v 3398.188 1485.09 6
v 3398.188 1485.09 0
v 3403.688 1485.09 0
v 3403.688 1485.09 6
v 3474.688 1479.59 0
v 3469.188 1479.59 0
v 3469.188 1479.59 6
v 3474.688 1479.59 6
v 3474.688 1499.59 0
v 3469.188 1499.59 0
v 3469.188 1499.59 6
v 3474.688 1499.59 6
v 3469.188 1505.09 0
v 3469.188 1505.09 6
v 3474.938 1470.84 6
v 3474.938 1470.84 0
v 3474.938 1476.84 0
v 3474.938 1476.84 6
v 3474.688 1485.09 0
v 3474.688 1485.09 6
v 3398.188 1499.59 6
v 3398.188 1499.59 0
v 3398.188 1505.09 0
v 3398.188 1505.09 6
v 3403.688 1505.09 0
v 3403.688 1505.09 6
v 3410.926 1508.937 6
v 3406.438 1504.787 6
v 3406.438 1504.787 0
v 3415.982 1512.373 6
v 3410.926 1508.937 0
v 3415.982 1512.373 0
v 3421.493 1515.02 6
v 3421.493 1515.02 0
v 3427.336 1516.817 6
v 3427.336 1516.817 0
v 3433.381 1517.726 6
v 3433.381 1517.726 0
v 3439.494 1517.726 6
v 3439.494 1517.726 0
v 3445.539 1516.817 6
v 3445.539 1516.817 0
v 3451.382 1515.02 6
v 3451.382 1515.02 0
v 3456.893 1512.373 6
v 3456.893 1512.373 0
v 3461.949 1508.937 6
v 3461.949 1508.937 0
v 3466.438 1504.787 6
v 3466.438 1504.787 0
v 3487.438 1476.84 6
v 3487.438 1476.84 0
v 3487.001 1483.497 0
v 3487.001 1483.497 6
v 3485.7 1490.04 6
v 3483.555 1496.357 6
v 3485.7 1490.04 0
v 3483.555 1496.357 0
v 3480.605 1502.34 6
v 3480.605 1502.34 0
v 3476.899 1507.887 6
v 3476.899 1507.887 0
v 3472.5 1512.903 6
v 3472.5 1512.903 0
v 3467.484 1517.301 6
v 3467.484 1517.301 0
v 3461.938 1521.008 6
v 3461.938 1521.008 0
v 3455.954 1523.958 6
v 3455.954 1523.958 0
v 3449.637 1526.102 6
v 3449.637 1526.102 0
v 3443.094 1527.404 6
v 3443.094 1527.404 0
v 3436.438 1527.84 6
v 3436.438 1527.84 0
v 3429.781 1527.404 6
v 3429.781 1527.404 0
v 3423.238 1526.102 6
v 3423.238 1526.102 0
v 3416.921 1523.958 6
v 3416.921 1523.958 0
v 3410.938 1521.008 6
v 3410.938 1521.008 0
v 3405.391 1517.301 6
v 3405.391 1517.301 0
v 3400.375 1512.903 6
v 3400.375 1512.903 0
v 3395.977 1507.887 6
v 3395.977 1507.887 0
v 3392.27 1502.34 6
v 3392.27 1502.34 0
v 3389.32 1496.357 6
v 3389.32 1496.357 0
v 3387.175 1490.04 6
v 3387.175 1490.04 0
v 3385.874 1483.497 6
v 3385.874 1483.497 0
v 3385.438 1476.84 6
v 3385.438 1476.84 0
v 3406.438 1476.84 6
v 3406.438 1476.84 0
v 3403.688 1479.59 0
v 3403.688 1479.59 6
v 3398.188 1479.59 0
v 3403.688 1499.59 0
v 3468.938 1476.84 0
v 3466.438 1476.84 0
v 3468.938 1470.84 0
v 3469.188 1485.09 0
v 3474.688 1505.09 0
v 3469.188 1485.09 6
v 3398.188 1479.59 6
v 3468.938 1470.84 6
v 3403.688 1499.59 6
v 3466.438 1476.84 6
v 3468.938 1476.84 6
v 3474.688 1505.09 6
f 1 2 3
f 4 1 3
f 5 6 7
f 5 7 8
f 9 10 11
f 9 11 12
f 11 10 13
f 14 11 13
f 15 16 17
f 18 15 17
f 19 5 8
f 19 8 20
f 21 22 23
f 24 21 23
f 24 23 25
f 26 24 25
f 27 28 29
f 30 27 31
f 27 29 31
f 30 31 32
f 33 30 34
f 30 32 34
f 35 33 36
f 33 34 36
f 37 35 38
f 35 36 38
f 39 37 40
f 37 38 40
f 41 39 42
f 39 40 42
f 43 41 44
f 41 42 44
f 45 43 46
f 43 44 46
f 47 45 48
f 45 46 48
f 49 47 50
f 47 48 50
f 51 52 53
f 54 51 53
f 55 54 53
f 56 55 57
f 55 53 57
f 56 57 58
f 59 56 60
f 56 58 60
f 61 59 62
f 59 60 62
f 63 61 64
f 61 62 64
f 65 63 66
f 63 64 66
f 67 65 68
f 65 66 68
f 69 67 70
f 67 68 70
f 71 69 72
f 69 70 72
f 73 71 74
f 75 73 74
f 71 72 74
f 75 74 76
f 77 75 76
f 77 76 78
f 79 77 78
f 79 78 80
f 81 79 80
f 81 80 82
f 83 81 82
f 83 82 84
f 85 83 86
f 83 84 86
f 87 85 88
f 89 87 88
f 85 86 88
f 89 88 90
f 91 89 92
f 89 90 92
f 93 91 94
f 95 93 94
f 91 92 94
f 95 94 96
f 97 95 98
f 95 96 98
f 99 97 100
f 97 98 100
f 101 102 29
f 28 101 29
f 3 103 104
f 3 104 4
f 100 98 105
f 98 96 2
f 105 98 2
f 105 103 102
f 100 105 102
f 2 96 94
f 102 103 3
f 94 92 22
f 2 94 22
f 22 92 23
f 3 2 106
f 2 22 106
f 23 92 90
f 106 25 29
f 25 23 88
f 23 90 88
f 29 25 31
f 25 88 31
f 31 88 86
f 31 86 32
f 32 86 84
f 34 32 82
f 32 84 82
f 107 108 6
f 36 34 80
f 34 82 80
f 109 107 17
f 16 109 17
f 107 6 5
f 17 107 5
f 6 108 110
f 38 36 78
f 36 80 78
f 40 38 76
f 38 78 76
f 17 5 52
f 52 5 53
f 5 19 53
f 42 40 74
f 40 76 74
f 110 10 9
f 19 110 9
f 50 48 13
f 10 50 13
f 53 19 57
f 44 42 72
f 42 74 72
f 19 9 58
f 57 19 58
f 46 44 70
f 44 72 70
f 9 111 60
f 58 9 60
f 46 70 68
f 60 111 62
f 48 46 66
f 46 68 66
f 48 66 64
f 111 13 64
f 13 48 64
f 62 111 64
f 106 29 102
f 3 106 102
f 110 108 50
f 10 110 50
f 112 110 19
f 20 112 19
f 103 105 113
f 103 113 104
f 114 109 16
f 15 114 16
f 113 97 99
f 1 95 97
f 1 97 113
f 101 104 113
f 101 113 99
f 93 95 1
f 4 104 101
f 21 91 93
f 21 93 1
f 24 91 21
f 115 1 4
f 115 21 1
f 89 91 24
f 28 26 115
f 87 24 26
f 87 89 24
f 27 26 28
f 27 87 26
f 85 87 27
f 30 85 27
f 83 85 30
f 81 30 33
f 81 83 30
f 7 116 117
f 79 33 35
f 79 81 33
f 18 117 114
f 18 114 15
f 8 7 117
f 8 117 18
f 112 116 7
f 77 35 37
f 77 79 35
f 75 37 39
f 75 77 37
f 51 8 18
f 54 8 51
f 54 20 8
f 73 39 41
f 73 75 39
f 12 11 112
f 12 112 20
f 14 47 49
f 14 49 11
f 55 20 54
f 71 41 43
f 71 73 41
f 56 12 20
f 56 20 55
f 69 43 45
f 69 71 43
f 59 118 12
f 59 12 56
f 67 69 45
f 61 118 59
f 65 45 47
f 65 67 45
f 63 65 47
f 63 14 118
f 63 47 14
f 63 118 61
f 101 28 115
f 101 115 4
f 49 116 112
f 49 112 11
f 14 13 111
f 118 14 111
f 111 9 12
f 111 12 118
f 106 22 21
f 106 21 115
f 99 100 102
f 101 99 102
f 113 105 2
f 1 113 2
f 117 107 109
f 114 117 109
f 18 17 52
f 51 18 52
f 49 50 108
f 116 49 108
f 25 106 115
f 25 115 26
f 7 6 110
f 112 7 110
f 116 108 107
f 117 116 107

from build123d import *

# Parameters (mm, degrees)
MODEL_W             = 5.5
MODEL_H             = 5.5
BOSS_EXTRUDE1_DEPTH = 6


with BuildPart() as part:
    # Model → Boss-Extrude1 (new body)
    with BuildSketch(Plane.XY):
        with BuildLine():
            Line((3385.437630562, 1476.840270732), (3395.437630562, 1476.840270732))
            Line((3395.437630562, 1476.840270732), (3406.437630562, 1476.840270732))
            Line((3406.437630562, 1476.840270732), (3406.437630562, 1504.786647956))
            ThreePointArc((3406.437630562, 1504.786647956), (3436.437630562, 1517.840270732), (3466.437630562, 1504.786647956))
            Line((3466.437630562, 1504.786647956), (3466.437630562, 1476.840270732))
            Line((3466.437630562, 1476.840270732), (3468.937630562, 1476.840270732))
            Line((3468.937630562, 1476.840270732), (3468.937630562, 1470.840270732))
            Line((3468.937630562, 1470.840270732), (3474.937630562, 1470.840270732))
            Line((3474.937630562, 1470.840270732), (3474.937630562, 1476.840270732))
            Line((3474.937630562, 1476.840270732), (3487.437630562, 1476.840270732))
            ThreePointArc((3487.437630562, 1476.840270732), (3436.437630562, 1527.840270732), (3385.437630562, 1476.840270732))
        make_face()
        with Locations((3471.937630562, 1482.340270732)):
            Rectangle(MODEL_W, MODEL_H, mode=Mode.SUBTRACT)
        with Locations((3471.937630562, 1502.340270732)):
            Rectangle(MODEL_W, MODEL_H, mode=Mode.SUBTRACT)
        with Locations((3400.937630562, 1482.340270732)):
            Rectangle(MODEL_W, MODEL_H, mode=Mode.SUBTRACT)
        with Locations((3400.937630562, 1502.340270732)):
            Rectangle(MODEL_W, MODEL_H, mode=Mode.SUBTRACT)
    extrude(amount=BOSS_EXTRUDE1_DEPTH)


solid = part.part
